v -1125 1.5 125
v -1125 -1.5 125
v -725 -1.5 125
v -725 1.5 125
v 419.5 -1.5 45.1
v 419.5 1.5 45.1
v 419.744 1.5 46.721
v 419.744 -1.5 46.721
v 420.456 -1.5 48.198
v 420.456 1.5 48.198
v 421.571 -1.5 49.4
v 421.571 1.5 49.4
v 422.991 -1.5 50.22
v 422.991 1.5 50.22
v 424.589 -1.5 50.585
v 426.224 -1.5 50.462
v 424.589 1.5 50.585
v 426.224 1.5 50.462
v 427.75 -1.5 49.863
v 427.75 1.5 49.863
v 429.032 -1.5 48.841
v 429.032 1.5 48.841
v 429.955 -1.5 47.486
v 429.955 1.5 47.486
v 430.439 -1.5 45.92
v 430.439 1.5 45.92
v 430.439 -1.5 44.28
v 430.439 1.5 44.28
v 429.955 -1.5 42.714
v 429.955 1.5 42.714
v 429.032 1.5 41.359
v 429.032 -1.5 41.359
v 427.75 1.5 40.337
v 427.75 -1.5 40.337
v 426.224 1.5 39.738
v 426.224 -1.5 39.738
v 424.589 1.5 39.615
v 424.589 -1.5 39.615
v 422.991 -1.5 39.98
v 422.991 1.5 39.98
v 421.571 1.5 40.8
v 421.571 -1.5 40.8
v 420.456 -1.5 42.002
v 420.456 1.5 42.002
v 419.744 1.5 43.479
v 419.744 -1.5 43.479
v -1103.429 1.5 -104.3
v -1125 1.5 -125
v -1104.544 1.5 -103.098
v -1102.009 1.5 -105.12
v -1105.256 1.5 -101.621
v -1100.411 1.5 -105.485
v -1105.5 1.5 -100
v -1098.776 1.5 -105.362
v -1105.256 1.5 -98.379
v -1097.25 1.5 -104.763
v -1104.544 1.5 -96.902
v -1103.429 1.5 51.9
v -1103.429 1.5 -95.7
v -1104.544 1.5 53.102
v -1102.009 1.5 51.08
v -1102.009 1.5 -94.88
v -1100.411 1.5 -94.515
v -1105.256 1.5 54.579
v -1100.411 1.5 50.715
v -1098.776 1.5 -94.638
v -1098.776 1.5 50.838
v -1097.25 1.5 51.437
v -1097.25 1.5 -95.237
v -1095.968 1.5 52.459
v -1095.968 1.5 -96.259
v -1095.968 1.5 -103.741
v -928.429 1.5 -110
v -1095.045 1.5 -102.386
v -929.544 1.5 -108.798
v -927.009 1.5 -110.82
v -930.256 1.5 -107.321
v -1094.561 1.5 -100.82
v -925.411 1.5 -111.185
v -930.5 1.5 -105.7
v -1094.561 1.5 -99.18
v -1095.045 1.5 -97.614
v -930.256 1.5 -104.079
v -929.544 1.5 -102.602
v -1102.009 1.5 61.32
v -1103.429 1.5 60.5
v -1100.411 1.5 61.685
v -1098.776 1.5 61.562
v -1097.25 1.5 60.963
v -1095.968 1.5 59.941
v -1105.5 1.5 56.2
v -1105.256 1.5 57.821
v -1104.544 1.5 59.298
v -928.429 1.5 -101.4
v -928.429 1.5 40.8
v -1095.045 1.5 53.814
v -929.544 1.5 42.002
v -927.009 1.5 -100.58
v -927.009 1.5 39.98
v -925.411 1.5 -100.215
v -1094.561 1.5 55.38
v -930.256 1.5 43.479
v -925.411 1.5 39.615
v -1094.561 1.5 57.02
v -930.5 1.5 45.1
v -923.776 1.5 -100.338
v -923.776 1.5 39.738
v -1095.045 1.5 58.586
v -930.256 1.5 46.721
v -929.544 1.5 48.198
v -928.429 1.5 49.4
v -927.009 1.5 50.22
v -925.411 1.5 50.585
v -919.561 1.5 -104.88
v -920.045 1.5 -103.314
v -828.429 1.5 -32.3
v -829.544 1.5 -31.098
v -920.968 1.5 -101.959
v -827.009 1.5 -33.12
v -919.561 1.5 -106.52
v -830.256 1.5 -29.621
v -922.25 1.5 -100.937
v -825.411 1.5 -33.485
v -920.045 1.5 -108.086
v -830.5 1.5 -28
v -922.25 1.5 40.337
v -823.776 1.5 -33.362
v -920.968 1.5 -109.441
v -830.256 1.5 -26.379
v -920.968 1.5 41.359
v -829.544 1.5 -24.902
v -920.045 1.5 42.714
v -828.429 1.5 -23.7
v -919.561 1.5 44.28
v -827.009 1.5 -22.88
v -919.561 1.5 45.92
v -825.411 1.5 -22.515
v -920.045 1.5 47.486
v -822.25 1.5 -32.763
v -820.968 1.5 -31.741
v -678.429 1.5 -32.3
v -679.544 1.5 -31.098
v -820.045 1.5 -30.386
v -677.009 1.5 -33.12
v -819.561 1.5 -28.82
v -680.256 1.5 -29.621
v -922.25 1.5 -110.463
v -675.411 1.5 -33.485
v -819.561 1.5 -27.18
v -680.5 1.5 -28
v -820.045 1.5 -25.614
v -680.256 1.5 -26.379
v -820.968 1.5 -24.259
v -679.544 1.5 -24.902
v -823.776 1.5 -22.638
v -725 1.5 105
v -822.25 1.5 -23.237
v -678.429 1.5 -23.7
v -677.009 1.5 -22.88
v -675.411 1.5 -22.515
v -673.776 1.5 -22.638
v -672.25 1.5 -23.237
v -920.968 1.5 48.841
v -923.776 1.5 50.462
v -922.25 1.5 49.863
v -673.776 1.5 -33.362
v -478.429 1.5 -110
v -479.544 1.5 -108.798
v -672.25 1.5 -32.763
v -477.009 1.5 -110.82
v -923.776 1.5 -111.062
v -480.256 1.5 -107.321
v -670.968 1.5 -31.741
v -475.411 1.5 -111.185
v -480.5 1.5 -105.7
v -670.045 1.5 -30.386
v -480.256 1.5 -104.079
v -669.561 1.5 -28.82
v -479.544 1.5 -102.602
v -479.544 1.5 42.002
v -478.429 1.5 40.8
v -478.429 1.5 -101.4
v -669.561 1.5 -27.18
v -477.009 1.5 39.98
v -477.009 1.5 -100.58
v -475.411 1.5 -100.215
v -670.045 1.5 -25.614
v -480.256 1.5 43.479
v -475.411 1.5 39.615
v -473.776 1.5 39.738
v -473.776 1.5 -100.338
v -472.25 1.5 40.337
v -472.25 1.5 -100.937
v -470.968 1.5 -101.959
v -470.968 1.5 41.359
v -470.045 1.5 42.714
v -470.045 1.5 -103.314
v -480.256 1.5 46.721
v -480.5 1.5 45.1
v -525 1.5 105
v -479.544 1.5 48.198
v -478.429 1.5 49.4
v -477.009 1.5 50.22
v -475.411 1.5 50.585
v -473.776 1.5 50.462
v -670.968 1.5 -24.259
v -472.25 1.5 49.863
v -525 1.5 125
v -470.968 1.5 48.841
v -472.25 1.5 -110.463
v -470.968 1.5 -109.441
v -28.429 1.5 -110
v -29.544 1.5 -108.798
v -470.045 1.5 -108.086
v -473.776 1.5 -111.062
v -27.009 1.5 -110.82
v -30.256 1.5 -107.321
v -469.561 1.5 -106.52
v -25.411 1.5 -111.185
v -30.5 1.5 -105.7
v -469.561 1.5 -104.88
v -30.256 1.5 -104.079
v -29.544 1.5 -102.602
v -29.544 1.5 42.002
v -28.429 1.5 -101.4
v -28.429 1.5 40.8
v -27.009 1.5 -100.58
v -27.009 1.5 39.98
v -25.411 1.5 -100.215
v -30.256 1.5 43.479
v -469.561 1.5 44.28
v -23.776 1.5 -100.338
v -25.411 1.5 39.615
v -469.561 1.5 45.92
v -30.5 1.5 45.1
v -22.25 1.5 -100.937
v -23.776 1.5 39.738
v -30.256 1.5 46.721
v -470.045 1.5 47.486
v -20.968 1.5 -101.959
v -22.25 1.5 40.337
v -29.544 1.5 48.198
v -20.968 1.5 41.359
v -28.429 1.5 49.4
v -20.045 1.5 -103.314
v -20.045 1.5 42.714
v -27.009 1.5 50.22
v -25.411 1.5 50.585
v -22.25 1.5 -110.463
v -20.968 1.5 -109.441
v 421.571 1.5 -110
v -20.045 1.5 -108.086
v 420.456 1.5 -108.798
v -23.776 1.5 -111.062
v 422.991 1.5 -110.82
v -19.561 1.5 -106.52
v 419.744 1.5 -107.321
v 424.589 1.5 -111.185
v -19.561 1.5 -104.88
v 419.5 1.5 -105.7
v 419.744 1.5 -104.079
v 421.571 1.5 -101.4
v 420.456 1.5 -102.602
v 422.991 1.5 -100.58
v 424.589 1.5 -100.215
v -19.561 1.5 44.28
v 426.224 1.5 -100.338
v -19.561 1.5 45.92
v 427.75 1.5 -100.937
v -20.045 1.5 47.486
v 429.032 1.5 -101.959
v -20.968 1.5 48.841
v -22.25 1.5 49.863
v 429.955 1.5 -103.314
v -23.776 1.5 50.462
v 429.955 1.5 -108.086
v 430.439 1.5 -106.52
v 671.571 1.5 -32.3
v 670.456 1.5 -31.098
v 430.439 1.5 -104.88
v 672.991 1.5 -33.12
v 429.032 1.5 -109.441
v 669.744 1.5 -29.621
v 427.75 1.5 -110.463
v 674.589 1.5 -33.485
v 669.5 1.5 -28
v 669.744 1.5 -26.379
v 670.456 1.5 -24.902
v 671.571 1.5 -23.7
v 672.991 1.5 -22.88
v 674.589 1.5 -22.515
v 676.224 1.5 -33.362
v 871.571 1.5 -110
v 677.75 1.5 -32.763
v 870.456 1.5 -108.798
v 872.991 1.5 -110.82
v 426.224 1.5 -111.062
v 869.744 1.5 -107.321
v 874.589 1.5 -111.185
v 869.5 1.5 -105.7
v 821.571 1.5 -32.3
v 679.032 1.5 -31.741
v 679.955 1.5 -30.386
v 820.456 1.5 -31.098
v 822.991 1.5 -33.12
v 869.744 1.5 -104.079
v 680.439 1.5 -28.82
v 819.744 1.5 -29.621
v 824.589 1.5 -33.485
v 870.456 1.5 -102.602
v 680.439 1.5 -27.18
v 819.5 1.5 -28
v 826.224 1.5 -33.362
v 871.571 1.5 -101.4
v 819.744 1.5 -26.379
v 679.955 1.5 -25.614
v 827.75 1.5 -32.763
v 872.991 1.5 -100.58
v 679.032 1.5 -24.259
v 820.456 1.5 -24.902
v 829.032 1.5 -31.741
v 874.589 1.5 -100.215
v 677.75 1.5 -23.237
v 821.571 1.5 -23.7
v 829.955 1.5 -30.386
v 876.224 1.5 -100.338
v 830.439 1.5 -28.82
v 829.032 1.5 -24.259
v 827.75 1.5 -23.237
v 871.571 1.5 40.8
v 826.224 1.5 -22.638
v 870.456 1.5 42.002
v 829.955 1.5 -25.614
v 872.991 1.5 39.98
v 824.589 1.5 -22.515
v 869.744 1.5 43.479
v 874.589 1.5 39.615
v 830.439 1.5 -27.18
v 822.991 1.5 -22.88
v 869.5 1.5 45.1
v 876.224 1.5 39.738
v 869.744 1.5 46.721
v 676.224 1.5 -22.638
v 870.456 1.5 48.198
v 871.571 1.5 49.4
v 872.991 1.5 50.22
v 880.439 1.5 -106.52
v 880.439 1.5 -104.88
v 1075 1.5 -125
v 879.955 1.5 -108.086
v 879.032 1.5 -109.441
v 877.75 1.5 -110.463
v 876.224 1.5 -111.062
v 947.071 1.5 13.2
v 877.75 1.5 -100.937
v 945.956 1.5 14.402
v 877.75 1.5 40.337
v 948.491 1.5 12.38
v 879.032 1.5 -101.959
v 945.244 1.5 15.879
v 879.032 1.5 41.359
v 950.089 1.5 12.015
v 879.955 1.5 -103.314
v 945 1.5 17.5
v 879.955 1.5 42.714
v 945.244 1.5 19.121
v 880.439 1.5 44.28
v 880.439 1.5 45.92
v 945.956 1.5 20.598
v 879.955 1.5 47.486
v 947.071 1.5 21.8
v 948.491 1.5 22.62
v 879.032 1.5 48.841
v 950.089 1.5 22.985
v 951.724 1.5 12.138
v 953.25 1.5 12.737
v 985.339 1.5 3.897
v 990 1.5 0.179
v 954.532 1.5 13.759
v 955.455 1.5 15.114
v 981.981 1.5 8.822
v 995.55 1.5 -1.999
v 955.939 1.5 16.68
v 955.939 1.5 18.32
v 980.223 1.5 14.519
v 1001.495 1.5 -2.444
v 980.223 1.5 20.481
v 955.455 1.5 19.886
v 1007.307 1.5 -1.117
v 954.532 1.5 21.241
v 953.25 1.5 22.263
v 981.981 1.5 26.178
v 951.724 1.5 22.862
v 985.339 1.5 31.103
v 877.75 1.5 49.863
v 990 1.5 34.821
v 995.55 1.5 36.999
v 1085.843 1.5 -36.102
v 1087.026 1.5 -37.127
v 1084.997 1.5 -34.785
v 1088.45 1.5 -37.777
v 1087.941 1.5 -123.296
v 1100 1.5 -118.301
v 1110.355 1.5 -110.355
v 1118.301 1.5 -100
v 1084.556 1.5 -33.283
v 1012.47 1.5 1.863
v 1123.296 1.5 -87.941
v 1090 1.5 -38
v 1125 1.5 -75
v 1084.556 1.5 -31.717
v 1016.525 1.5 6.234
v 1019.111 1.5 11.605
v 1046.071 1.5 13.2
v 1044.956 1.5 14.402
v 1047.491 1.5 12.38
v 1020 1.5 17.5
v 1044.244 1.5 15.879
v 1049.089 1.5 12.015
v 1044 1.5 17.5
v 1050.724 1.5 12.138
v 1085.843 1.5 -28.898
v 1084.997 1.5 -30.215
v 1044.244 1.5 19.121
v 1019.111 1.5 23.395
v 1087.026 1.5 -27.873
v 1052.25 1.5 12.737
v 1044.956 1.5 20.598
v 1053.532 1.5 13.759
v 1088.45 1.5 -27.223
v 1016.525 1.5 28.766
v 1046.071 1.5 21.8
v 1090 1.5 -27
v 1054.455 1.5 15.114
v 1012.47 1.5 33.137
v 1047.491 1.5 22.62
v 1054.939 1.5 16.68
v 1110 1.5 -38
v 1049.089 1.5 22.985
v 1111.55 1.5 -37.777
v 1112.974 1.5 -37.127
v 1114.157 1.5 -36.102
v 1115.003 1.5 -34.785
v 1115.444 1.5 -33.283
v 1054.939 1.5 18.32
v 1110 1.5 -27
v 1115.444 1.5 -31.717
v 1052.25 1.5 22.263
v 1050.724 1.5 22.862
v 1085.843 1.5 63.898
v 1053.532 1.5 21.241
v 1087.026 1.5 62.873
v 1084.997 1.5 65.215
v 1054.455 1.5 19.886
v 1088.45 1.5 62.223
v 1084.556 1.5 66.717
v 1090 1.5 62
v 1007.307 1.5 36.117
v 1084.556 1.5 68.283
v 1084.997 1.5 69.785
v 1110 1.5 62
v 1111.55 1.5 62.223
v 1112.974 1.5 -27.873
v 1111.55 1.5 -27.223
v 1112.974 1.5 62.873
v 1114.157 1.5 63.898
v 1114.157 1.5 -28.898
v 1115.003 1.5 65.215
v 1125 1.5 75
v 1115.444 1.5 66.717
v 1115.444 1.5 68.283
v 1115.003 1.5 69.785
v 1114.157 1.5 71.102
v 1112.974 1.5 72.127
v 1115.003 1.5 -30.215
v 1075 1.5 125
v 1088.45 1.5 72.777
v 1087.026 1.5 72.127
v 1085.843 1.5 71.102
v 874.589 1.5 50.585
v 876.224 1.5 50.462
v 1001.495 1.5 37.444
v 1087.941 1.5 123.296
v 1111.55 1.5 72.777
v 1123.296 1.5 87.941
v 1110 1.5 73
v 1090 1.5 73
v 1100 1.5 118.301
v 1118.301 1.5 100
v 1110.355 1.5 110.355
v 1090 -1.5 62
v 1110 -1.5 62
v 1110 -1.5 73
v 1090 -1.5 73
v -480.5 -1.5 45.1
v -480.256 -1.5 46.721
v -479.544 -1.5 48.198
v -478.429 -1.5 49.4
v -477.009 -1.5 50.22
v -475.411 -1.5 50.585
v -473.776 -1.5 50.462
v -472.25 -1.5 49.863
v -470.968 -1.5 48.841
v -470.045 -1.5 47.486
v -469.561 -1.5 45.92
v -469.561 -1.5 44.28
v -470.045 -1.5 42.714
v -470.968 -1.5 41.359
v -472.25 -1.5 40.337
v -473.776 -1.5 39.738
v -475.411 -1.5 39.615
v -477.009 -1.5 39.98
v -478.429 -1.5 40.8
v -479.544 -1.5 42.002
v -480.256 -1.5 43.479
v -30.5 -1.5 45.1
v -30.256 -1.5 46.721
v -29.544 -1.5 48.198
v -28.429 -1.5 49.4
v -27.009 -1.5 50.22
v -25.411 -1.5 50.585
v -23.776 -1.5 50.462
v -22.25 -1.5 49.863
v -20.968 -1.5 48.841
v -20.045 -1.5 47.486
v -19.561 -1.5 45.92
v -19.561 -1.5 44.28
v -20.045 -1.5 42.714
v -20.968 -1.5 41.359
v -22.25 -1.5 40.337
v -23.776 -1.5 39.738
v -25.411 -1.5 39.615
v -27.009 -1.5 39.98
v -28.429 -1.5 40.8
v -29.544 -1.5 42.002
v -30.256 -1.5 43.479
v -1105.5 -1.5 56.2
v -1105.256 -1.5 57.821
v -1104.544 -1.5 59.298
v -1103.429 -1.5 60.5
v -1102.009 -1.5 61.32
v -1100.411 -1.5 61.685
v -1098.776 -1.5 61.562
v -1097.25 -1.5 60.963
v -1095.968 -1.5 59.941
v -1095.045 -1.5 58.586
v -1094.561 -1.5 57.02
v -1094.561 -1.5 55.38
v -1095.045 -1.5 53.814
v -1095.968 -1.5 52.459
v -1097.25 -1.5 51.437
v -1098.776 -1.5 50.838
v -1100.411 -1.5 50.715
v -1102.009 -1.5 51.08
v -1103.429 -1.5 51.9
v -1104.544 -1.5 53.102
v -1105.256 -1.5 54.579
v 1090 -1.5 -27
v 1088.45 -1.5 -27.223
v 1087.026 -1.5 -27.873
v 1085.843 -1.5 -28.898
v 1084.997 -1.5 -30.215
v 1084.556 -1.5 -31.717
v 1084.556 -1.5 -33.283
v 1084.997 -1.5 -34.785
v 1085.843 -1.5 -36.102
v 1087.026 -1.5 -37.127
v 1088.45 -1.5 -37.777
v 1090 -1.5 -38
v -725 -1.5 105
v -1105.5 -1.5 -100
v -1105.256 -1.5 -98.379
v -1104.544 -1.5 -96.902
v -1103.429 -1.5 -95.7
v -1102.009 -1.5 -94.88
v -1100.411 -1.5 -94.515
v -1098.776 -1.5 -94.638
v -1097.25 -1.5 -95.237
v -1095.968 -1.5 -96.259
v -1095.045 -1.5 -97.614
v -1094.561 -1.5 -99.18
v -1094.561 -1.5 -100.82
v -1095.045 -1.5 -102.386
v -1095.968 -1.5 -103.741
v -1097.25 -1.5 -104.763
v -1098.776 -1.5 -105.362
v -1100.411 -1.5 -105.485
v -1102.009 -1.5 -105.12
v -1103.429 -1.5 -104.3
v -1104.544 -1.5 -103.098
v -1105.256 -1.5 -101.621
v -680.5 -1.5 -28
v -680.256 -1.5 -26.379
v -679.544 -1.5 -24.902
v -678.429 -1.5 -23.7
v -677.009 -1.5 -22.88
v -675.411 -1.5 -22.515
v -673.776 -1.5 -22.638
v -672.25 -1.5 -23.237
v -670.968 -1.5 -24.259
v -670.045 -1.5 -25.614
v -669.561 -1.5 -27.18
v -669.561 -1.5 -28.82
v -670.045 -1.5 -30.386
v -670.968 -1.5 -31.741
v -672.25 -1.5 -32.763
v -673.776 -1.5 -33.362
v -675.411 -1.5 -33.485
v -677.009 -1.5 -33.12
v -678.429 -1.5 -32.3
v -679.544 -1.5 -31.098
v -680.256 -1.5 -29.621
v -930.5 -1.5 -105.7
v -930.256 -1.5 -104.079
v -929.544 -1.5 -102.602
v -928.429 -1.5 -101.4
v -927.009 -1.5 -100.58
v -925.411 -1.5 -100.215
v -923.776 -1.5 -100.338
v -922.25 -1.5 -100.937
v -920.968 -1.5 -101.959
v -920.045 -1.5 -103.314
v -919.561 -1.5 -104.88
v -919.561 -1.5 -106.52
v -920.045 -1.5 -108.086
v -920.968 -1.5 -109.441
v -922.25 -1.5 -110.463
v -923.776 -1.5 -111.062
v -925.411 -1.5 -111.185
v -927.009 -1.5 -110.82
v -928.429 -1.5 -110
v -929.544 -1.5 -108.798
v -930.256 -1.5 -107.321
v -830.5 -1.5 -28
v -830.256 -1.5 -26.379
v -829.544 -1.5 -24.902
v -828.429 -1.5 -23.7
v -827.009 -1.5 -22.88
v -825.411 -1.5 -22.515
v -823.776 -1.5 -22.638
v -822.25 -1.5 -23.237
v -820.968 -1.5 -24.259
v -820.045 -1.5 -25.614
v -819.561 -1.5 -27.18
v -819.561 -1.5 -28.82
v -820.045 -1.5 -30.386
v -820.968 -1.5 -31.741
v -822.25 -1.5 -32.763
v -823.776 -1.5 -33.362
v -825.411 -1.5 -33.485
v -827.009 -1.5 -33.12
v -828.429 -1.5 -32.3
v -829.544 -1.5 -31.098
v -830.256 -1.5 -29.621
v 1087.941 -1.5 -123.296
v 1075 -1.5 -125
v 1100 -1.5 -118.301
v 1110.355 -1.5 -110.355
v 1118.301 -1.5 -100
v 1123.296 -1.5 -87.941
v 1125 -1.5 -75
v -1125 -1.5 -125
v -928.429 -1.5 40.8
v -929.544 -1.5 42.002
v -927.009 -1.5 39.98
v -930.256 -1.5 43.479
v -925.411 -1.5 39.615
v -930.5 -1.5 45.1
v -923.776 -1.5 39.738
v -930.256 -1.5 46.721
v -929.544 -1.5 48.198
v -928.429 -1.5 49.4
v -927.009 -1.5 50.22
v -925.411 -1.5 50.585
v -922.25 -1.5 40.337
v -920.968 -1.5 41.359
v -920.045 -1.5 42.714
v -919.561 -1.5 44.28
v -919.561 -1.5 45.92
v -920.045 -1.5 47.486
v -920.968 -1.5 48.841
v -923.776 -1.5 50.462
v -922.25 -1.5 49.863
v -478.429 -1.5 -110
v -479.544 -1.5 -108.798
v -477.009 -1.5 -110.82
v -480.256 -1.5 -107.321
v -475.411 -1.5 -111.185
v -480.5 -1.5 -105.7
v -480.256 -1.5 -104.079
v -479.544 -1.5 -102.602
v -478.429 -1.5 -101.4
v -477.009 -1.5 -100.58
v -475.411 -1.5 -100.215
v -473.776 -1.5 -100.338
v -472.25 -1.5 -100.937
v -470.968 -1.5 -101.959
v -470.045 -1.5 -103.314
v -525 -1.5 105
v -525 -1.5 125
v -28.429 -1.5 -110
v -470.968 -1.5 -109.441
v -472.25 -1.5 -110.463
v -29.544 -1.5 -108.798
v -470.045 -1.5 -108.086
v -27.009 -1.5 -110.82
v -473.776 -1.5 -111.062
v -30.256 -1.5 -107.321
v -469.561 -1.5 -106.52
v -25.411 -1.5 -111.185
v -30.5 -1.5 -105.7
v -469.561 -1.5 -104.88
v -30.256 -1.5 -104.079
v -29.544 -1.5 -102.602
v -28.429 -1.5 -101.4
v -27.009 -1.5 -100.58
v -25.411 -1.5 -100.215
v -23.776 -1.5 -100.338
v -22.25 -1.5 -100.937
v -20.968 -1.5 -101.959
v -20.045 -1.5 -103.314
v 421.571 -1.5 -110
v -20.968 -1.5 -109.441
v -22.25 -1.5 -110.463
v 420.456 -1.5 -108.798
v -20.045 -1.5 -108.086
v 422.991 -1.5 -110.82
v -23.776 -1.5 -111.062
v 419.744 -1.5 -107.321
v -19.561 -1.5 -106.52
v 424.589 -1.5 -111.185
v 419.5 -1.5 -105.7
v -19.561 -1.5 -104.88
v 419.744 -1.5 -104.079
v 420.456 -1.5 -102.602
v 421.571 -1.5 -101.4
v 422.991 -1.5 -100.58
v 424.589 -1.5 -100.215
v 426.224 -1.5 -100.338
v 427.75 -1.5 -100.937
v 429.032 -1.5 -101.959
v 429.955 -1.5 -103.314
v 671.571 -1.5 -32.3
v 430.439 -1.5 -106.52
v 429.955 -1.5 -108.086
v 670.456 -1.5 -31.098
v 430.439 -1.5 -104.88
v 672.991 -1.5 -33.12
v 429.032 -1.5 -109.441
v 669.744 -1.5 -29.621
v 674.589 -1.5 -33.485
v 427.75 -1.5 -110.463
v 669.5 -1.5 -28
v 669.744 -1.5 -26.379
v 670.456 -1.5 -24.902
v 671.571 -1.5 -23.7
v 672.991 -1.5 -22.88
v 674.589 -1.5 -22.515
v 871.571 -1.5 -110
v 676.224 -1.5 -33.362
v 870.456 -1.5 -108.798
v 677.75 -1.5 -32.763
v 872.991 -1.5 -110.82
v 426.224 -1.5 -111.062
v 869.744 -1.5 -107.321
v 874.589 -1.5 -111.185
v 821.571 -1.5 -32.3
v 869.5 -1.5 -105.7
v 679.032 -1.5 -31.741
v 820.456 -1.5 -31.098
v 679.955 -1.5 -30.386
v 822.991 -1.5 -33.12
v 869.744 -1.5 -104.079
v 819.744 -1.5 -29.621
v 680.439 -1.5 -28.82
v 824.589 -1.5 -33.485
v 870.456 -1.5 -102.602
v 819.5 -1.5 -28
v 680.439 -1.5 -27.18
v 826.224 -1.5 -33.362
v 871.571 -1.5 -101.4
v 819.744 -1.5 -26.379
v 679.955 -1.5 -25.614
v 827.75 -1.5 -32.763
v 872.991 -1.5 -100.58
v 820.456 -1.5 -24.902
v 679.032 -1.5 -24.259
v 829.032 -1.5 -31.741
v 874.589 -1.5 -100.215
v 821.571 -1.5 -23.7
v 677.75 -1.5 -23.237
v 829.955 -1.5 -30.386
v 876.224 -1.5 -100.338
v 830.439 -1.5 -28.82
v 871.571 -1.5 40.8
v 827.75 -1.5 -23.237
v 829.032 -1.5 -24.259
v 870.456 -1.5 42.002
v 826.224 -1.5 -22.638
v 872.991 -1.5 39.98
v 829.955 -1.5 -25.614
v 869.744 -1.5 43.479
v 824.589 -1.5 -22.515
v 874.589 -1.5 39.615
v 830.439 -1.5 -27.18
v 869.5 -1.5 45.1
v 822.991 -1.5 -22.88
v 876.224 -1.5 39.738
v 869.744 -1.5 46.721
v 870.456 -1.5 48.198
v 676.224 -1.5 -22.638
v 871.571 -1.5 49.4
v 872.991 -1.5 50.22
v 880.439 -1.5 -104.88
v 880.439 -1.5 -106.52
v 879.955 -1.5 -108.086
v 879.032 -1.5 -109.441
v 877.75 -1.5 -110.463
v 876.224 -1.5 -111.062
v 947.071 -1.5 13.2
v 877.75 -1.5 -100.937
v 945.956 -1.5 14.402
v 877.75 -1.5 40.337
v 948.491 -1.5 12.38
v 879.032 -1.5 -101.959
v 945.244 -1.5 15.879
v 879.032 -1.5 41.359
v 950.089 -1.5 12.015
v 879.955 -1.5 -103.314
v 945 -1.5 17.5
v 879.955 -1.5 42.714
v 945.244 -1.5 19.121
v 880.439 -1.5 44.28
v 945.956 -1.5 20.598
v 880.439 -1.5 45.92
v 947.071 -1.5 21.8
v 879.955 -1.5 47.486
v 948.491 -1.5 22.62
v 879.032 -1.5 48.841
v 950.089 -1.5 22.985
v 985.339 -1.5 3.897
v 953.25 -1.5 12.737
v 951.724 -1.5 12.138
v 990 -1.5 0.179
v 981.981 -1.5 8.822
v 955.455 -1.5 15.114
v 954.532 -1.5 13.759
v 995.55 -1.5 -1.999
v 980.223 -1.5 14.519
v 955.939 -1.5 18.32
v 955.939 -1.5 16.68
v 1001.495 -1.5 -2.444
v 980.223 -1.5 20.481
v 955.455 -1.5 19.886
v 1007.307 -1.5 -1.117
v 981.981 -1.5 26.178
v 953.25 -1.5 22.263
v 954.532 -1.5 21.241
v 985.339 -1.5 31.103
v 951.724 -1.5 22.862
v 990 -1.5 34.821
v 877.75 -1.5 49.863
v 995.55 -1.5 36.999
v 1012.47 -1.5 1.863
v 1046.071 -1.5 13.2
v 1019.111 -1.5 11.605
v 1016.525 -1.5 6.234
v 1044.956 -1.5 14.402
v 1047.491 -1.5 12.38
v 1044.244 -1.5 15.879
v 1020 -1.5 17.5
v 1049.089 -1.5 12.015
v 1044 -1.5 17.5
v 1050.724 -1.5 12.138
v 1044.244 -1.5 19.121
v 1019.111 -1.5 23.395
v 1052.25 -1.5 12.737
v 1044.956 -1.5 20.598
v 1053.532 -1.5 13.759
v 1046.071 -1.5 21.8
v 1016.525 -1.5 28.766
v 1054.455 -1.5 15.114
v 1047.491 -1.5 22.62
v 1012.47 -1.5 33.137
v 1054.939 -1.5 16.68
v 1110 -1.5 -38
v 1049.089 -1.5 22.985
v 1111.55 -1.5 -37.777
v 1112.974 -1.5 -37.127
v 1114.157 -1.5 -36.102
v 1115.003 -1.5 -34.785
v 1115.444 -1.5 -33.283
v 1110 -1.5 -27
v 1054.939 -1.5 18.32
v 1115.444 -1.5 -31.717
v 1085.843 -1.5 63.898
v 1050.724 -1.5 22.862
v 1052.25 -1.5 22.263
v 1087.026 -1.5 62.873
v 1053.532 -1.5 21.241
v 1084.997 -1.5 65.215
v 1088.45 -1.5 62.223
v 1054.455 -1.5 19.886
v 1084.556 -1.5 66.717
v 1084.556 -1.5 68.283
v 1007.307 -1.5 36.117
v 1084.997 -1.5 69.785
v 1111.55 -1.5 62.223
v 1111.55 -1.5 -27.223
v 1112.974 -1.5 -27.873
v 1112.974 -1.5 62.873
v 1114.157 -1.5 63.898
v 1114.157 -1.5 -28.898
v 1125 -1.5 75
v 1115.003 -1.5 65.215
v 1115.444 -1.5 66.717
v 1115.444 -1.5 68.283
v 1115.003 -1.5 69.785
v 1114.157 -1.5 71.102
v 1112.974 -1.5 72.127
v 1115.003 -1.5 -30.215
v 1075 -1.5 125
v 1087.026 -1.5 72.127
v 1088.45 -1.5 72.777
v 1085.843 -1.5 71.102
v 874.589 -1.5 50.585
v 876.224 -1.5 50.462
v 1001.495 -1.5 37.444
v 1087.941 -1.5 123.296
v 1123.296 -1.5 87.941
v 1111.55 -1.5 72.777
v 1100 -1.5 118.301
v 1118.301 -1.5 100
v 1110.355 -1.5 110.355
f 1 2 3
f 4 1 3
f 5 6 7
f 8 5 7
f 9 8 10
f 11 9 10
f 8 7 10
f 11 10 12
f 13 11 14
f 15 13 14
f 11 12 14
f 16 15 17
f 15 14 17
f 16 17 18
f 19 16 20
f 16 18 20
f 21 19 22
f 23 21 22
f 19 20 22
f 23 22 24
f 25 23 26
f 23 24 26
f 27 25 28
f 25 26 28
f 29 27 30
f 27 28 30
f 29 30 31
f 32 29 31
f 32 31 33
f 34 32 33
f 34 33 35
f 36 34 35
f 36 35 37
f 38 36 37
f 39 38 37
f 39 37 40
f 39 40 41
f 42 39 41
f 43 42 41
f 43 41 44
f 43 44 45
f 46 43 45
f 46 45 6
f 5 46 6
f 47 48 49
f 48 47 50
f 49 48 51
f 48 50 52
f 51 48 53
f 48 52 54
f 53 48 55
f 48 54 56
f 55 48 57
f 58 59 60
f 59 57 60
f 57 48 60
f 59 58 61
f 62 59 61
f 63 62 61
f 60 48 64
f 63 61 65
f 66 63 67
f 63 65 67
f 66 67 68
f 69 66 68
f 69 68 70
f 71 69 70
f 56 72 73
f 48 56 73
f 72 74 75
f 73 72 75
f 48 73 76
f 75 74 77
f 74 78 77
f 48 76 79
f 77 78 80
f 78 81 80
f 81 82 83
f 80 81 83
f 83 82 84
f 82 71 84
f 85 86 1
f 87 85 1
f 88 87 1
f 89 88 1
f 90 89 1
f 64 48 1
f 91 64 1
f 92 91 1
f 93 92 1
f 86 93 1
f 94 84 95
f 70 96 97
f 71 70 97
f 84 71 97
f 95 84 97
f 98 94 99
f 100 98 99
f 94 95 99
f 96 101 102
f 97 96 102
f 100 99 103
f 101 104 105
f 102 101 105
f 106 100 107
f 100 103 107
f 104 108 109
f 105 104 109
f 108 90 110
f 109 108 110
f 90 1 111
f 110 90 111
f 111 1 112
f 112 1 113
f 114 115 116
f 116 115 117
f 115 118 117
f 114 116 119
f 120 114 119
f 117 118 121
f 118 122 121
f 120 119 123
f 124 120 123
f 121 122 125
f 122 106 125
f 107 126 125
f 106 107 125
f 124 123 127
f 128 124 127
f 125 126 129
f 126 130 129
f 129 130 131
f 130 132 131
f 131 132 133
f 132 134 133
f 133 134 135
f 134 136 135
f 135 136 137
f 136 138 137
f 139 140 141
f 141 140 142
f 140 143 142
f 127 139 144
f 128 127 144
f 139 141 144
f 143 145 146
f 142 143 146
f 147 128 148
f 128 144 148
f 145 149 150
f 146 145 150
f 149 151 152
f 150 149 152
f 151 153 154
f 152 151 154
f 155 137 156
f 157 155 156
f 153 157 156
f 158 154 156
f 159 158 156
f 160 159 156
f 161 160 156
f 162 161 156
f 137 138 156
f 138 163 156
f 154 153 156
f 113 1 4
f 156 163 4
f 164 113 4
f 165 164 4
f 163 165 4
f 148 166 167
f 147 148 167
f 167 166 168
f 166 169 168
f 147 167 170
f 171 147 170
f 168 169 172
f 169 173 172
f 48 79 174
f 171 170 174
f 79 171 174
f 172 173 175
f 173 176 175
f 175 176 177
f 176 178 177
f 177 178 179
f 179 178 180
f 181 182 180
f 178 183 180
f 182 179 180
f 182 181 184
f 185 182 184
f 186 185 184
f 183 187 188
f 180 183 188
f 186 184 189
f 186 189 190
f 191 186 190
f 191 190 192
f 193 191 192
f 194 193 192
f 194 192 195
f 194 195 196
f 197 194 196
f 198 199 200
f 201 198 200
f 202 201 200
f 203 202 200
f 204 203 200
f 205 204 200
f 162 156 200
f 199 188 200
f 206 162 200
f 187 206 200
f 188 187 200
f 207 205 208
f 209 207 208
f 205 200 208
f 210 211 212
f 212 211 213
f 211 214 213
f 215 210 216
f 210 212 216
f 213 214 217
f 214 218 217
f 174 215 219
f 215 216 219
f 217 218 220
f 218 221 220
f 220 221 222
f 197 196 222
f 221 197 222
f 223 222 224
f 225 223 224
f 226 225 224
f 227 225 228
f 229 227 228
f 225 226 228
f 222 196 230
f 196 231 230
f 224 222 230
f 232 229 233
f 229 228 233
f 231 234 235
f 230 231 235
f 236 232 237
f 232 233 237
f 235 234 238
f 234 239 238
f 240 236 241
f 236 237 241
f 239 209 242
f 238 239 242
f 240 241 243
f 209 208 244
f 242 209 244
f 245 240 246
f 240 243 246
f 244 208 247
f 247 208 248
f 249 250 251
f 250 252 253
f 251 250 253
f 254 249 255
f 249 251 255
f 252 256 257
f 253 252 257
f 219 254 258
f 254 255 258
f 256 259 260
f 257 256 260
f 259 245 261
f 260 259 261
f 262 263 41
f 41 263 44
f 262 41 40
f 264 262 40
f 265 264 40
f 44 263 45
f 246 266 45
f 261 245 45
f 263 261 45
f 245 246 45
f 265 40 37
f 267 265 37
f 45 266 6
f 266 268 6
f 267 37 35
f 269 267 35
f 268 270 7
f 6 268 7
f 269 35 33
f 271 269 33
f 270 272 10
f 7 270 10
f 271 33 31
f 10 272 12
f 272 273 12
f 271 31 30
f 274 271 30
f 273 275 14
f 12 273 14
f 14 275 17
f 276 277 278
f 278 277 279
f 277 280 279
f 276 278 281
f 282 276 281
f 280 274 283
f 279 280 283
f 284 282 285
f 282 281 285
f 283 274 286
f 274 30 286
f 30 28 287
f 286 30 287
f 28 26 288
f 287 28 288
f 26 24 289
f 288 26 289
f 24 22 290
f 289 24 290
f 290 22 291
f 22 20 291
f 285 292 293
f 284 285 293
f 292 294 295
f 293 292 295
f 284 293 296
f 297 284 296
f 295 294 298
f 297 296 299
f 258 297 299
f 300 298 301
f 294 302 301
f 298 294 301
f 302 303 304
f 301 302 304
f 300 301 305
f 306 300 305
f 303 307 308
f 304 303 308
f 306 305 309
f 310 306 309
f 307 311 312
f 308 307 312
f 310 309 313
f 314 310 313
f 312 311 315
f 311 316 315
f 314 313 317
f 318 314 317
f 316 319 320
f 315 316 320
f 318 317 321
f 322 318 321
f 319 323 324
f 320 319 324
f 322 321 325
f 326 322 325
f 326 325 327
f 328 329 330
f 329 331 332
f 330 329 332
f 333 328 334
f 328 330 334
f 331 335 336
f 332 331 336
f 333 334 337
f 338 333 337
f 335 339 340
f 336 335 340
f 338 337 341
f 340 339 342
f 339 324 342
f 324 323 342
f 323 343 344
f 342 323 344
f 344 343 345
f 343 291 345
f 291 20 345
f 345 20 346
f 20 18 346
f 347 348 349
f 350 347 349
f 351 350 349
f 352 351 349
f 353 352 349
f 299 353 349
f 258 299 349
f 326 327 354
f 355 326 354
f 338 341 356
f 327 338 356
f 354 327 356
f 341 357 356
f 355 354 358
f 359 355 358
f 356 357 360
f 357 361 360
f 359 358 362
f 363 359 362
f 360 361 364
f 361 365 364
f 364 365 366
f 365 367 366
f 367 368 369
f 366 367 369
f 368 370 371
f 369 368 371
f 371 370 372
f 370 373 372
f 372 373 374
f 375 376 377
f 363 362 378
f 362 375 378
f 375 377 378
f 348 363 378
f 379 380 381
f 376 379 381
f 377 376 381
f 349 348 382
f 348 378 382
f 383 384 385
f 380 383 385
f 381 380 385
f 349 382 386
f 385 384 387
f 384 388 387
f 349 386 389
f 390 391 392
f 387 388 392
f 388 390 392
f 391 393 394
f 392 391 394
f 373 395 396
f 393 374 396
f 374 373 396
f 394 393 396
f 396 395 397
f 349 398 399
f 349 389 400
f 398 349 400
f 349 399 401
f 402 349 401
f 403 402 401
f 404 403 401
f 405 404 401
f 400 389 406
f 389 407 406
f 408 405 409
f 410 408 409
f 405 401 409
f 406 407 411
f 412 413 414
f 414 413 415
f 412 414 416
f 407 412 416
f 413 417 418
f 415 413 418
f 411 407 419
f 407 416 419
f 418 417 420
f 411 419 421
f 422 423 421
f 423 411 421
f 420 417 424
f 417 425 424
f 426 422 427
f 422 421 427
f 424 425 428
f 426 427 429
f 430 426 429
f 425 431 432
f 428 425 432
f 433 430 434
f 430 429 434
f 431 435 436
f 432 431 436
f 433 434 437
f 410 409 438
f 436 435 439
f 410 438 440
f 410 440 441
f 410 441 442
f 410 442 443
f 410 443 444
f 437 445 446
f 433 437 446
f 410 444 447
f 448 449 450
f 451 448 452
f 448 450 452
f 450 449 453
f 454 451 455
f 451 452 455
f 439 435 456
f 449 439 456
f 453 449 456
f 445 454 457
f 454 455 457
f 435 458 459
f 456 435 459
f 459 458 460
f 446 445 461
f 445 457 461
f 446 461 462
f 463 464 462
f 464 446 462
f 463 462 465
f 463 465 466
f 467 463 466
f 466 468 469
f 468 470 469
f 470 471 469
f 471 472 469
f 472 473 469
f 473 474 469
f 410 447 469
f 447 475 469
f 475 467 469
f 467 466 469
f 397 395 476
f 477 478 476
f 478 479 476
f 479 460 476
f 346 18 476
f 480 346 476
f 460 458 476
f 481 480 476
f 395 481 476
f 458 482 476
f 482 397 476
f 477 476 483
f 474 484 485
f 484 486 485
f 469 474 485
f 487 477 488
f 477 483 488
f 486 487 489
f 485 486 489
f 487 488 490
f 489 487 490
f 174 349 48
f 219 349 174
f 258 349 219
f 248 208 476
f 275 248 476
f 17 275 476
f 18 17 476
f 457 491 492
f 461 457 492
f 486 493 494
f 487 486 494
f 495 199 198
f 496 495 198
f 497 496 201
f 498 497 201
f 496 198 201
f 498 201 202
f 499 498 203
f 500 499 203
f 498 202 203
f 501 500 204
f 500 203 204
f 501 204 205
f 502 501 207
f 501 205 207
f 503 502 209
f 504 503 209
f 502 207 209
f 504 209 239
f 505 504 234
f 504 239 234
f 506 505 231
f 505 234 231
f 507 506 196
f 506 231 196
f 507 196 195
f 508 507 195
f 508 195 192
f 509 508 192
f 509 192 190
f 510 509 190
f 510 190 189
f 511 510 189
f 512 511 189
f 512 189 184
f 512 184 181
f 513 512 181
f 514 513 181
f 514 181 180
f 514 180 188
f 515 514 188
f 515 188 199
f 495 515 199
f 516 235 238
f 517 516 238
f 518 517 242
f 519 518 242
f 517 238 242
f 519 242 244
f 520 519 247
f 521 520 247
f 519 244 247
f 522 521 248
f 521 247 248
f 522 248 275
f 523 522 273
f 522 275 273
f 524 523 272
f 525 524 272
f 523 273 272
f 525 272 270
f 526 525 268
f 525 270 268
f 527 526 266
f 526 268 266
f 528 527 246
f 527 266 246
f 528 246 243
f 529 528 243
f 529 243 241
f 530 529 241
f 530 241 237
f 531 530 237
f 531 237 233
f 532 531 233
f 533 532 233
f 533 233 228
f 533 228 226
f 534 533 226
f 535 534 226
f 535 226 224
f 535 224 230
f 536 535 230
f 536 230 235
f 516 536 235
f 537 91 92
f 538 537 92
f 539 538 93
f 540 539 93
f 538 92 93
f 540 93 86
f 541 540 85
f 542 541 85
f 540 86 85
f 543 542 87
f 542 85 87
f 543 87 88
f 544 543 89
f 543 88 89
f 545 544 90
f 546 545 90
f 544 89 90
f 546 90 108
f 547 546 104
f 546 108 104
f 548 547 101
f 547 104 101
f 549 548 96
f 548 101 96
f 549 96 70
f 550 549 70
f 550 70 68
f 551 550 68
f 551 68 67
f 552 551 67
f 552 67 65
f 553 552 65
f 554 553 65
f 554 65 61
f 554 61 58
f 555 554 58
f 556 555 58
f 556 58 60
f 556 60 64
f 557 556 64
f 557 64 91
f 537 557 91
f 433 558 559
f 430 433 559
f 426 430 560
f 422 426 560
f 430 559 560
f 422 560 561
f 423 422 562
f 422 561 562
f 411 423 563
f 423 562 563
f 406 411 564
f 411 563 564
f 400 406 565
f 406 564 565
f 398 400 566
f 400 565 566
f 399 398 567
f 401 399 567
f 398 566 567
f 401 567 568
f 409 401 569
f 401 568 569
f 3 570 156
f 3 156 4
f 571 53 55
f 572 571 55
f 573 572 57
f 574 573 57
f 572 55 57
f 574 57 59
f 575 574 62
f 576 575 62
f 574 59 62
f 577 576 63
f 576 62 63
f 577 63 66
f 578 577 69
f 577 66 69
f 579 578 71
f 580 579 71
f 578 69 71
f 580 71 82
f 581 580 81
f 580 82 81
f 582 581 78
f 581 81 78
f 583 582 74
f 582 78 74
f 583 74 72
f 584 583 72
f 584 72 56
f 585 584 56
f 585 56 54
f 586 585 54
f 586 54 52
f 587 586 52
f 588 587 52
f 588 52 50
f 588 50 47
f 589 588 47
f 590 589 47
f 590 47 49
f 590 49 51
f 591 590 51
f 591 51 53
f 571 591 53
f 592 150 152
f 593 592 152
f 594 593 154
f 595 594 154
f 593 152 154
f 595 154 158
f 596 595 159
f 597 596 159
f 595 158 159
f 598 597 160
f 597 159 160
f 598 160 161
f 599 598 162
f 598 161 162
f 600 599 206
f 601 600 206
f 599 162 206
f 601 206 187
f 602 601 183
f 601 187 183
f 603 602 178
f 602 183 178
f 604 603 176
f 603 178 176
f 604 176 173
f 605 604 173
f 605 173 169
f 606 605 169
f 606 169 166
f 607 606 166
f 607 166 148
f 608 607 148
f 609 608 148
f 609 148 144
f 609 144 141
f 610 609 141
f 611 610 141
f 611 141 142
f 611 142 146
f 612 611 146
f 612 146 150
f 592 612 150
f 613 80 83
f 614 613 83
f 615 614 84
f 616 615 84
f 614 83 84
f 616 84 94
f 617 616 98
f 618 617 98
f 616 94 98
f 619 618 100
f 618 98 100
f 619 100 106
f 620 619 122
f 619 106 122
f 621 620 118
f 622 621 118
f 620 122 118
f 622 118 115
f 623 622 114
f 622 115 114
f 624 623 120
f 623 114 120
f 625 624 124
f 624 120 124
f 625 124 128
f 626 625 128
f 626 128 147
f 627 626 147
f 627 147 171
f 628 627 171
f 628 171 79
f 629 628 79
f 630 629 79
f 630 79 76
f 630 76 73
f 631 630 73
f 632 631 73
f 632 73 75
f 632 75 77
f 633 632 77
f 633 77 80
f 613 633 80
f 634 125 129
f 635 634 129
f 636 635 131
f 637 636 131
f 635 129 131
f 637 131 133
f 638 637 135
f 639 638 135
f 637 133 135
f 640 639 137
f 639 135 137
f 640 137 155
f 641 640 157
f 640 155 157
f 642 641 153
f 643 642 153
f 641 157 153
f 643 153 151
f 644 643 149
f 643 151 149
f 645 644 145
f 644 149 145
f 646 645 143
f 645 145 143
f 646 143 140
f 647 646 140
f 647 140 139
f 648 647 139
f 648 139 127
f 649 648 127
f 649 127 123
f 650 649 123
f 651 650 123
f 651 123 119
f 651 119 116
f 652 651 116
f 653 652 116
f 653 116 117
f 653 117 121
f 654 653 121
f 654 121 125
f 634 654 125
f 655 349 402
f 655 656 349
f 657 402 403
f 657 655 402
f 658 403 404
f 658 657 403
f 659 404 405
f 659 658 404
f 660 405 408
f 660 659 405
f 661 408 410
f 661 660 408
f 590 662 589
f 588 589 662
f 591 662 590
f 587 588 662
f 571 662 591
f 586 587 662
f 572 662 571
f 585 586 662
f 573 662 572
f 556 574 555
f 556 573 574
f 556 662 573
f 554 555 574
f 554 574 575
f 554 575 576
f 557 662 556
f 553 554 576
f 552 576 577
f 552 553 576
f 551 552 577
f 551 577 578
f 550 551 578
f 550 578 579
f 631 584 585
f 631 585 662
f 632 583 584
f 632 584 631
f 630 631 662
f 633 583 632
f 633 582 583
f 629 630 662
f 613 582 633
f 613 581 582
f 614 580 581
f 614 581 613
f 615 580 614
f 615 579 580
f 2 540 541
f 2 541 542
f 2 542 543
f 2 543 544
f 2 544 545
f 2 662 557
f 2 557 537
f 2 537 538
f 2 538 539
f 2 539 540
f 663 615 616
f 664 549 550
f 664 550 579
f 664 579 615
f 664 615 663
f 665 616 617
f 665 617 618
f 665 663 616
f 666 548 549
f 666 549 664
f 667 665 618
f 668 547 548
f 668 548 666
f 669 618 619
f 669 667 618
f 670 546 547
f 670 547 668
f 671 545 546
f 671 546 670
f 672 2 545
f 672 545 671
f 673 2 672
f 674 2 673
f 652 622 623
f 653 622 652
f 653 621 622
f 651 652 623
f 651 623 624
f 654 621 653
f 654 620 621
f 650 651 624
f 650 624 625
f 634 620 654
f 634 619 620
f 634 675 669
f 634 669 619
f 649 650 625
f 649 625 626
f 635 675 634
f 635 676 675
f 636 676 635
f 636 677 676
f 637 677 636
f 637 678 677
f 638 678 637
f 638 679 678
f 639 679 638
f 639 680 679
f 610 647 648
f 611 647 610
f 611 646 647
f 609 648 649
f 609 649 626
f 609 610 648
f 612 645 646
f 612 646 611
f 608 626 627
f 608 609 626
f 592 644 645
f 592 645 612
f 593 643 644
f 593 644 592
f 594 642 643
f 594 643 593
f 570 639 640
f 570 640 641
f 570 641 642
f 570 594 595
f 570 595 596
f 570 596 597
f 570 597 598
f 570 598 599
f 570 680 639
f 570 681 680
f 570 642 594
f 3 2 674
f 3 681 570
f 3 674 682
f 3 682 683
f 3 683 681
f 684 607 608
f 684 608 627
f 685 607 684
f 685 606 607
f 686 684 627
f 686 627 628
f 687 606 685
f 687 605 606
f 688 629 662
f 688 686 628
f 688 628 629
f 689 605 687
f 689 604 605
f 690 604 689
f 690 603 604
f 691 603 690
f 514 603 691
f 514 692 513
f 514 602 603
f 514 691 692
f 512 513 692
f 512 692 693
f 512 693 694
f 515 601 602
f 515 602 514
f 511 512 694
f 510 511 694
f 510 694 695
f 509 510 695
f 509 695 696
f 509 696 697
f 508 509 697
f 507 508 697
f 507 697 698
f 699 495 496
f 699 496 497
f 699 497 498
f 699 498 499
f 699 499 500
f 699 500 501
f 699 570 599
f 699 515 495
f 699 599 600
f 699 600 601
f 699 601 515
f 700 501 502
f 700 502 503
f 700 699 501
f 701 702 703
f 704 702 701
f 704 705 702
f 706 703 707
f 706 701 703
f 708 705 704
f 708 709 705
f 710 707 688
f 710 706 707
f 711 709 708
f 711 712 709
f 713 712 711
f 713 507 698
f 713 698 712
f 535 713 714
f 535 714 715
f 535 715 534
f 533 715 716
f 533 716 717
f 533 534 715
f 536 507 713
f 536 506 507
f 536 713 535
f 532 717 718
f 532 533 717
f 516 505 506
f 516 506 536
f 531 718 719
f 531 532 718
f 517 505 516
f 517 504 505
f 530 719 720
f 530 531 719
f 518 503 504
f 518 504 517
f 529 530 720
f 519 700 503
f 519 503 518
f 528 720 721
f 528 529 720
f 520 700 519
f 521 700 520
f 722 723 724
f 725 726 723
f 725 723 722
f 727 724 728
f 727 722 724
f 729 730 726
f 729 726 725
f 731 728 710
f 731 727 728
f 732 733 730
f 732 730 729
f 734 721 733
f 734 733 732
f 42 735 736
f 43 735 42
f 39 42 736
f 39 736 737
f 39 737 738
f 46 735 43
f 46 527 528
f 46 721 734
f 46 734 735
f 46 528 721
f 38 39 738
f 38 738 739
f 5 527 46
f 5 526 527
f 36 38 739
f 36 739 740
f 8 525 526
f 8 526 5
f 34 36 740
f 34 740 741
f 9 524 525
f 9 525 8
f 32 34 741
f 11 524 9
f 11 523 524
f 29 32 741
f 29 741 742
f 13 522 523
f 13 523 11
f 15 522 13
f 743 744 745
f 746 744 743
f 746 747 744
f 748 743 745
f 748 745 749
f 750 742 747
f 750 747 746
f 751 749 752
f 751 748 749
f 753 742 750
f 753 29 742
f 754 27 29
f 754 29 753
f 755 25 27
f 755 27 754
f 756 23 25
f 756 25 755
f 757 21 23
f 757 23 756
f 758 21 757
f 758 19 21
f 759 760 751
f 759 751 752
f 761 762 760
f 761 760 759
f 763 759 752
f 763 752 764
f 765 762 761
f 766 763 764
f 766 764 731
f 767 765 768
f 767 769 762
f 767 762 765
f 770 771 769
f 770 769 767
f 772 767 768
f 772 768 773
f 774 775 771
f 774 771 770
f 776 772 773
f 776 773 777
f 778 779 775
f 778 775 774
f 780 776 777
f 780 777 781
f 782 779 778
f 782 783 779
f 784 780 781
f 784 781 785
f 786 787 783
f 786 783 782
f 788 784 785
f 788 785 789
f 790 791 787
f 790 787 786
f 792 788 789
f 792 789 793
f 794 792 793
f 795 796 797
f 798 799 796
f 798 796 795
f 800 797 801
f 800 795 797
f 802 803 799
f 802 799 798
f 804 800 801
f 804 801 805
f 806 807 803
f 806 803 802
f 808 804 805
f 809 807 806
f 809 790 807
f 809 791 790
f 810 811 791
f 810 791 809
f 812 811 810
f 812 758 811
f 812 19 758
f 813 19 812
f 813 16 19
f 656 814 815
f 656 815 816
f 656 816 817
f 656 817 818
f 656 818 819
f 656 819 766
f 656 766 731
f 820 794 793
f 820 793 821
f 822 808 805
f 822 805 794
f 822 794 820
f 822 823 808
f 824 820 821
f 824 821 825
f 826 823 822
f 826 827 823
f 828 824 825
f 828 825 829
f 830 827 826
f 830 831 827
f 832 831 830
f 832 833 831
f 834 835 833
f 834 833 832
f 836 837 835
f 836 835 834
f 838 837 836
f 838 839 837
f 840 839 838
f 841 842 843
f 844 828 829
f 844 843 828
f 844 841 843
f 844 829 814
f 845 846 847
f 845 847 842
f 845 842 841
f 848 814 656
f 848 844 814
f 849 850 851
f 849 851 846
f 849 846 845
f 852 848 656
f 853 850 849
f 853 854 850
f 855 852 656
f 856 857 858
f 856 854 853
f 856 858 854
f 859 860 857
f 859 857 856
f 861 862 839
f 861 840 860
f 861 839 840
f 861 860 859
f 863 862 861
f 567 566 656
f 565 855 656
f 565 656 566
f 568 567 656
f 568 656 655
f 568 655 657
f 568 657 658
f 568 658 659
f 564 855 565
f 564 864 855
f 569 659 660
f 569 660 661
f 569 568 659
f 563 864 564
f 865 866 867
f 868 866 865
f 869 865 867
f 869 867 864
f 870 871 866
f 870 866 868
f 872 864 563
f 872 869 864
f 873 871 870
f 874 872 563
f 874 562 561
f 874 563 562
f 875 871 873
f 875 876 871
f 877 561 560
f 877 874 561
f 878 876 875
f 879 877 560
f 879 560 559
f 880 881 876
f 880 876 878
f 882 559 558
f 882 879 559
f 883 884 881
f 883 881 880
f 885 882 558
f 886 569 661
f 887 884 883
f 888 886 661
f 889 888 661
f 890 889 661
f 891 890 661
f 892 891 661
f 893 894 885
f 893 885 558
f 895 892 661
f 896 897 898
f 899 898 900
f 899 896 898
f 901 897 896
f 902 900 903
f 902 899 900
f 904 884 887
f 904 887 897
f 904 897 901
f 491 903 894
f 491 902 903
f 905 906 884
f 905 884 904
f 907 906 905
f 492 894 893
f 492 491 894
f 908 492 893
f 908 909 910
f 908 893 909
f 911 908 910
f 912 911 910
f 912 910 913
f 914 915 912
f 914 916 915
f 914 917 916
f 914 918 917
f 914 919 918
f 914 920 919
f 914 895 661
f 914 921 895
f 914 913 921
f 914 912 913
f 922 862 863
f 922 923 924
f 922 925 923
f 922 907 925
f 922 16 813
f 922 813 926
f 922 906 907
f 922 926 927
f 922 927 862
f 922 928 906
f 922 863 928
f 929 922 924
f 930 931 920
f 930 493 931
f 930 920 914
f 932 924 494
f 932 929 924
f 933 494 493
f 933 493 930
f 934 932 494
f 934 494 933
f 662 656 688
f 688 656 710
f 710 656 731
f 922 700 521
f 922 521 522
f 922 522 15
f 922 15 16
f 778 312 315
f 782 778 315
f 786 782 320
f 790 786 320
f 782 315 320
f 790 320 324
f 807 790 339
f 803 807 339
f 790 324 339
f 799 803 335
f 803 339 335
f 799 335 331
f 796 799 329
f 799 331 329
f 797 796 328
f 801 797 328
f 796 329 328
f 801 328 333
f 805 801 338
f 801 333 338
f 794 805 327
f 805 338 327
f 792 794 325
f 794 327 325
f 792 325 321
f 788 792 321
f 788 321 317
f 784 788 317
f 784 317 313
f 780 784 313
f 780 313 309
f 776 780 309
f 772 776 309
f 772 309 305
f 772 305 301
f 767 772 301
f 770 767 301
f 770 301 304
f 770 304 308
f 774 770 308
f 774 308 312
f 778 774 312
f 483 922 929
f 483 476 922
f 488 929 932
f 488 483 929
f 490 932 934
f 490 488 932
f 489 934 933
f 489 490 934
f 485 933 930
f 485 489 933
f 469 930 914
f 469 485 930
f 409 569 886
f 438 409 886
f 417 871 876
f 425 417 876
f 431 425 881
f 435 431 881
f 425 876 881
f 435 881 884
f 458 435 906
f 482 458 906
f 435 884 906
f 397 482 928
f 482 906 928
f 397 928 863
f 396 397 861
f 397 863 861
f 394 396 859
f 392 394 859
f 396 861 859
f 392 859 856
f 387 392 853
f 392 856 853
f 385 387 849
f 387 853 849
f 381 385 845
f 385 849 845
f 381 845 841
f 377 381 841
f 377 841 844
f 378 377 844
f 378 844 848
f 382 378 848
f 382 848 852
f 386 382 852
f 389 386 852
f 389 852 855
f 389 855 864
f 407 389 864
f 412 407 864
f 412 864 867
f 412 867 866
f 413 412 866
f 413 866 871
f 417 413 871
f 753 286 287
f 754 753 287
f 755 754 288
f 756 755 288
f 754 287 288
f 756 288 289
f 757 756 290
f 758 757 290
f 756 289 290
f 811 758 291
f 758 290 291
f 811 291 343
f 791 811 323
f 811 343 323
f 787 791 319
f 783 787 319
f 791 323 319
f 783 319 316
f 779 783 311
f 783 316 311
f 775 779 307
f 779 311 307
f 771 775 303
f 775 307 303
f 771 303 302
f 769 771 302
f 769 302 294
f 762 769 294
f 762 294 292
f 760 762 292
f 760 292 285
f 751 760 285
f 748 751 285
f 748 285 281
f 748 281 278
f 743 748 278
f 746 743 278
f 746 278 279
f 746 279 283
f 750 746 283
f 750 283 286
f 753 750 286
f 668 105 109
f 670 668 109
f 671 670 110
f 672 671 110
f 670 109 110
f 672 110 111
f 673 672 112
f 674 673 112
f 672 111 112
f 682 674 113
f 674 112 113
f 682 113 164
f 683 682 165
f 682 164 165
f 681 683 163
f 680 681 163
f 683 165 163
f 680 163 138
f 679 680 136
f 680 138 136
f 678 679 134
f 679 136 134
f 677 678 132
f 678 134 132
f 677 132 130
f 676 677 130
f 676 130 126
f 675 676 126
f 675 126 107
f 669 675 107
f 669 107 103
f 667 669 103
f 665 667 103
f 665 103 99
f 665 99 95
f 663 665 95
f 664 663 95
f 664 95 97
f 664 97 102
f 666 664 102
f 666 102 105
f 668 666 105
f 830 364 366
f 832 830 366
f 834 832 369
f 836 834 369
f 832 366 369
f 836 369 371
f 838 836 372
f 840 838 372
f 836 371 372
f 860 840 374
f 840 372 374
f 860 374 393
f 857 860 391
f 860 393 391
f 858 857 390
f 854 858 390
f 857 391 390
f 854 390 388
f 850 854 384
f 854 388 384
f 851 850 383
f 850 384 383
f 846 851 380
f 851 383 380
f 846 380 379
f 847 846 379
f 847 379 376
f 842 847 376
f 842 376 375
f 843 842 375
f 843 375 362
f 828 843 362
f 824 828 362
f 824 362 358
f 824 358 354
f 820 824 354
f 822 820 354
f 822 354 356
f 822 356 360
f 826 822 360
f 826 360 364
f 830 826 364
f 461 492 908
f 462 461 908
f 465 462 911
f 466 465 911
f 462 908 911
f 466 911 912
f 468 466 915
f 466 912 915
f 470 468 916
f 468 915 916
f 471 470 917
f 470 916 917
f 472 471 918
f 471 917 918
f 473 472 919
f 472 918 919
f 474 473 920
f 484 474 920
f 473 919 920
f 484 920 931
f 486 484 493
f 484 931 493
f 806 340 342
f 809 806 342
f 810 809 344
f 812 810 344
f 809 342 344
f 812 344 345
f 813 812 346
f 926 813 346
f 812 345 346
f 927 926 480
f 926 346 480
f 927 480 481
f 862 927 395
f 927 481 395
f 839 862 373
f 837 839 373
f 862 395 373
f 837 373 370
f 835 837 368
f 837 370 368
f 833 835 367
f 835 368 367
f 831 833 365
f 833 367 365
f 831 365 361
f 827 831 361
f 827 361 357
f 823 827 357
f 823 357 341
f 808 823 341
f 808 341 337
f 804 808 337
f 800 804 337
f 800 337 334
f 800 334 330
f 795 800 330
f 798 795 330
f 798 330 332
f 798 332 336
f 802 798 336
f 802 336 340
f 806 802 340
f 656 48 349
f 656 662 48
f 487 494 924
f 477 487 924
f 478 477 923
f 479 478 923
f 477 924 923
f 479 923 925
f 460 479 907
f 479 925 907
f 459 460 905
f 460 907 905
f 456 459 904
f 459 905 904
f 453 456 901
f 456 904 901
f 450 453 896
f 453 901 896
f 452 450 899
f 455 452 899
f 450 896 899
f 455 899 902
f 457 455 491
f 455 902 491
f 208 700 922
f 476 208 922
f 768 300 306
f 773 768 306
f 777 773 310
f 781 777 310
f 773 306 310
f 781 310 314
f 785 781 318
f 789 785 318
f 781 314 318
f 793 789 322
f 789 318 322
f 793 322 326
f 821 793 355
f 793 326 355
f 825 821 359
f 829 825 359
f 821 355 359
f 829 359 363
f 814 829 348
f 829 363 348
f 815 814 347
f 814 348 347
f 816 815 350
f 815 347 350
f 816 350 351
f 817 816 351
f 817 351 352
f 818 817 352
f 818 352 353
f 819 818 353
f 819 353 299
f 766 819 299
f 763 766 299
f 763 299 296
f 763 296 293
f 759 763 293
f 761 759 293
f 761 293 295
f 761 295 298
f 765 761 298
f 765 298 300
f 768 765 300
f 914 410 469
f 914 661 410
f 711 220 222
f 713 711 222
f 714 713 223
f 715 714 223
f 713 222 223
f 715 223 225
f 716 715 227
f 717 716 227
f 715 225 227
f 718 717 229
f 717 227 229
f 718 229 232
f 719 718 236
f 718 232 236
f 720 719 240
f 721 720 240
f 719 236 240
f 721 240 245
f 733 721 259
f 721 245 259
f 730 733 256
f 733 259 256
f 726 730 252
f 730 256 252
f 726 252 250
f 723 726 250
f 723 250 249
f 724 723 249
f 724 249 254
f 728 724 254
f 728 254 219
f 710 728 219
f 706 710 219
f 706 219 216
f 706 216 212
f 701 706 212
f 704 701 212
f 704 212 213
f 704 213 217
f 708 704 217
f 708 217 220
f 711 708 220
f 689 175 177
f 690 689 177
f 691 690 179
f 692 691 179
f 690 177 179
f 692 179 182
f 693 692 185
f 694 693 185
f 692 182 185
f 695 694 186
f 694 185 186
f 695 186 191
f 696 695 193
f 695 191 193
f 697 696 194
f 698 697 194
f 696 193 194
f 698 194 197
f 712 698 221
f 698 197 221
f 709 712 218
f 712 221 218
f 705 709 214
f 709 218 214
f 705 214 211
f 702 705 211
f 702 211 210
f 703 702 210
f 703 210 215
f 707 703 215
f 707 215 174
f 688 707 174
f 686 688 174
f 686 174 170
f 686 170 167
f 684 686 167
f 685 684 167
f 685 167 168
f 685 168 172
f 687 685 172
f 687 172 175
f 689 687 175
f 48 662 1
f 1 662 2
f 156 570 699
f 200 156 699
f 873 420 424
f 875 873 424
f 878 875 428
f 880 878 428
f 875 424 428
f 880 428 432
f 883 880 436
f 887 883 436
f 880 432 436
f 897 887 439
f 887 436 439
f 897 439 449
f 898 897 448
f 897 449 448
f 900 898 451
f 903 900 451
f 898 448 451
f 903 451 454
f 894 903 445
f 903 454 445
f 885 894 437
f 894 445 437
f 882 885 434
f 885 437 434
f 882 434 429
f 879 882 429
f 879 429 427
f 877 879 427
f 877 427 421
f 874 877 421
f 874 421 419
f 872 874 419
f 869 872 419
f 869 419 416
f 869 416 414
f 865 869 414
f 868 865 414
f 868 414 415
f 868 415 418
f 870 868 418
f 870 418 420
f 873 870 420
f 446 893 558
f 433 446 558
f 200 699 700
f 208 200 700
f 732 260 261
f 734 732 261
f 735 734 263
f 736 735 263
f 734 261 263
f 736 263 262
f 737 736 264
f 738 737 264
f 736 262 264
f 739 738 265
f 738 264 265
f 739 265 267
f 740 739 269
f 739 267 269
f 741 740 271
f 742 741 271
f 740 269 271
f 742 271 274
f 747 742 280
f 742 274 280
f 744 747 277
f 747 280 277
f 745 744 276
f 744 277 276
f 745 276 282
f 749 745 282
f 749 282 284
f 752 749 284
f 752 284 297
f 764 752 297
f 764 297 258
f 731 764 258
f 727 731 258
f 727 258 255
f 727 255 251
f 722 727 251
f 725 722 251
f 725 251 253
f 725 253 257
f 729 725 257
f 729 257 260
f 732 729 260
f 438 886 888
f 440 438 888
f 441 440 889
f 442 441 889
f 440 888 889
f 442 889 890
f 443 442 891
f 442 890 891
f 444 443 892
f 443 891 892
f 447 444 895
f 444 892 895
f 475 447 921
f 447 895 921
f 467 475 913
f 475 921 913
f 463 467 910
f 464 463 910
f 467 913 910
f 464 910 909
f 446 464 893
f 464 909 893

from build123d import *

# Parameters (mm, degrees)
F0_W      = 2250
F0_H      = 250
F1_DEPTH  = 1.5
F3_D      = 11
F3_DEPTH  = 18
F3_TIP    = 3.3047334047
F5_DEPTH  = 3.001
F6_R      = 20
F7_DEPTH  = 3.001
F9_D      = 11
F9_DEPTH  = 18
F9_TIP    = 3.3047334047
F10_R     = 50
F11_W     = 200
F11_H     = 20
F12_DEPTH = 3.001


with BuildPart() as f1:
    # F0 (on Front) → F1 (new body, symmetric)
    with BuildSketch(Plane.XZ):
        Rectangle(F0_W, F0_H)
    extrude(amount=F1_DEPTH, both=True)

    # F3
    with Locations(Plane.XZ.offset(1.5)):
        with Locations((-1100, 56.2), (-1100, -100), (-925, -105.7), (-925, 45.1), (675, -28), (825, -28), (875, -105.7), (875, 45.1), (-475, 45.1), (-475, -105.7), (-25, -105.7), (-25, 45.1), (425, 45.1), (425, -105.7), (-825, -28), (-675, -28)):
            Hole(F3_D / 2, depth=F3_DEPTH)
            with Locations((0, 0, -(F3_DEPTH + F3_TIP / 2))):  # 118° drill point
                Cone(0, F3_D / 2, F3_TIP, mode=Mode.SUBTRACT)

    # F4 (on face) → F5 (cut, through all)
    with BuildSketch(Plane.XZ.offset(1.5)):
        with BuildLine():
            ThreePointArc((1110, 62), (1115.5, 67.5), (1110, 73))
            Line((1110, 73), (1090, 73))
            ThreePointArc((1090, 73), (1084.5, 67.5), (1090, 62))
            Line((1090, 62), (1110, 62))
        make_face()
        with BuildLine():
            ThreePointArc((1110, -38), (1115.5, -32.5), (1110, -27))
            Line((1110, -27), (1090, -27))
            ThreePointArc((1090, -27), (1084.5, -32.5), (1090, -38))
            Line((1090, -38), (1110, -38))
        make_face()
    extrude(amount=-F5_DEPTH, mode=Mode.SUBTRACT)

    # F6 (on face) → F7 (cut, through all)
    with BuildSketch(Plane.XZ.offset(1.5)):
        with Locations((1000, 17.5)):
            Circle(F6_R)
    extrude(amount=-F7_DEPTH, mode=Mode.SUBTRACT)

    # F9
    with Locations(Plane.XZ.offset(1.5)):
        with Locations((950.5, 17.5), (1049.5, 17.5)):
            Hole(F9_D / 2, depth=F9_DEPTH)
            with Locations((0, 0, -(F9_DEPTH + F9_TIP / 2))):  # 118° drill point
                Cone(0, F9_D / 2, F9_TIP, mode=Mode.SUBTRACT)

    # F10
    f10_edges = [f1.edges().sort_by_distance(p)[0] for p in [
        (1125, 0, 125),
        (1125, 0, -125),
    ]]
    fillet(f10_edges, radius=F10_R)

    # F11 (on face) → F12 (cut, through all)
    with BuildSketch(Plane.XZ.offset(1.5)):
        with Locations((-625, 115)):
            Rectangle(F11_W, F11_H)
    extrude(amount=-F12_DEPTH, mode=Mode.SUBTRACT)


solid = f1.part
